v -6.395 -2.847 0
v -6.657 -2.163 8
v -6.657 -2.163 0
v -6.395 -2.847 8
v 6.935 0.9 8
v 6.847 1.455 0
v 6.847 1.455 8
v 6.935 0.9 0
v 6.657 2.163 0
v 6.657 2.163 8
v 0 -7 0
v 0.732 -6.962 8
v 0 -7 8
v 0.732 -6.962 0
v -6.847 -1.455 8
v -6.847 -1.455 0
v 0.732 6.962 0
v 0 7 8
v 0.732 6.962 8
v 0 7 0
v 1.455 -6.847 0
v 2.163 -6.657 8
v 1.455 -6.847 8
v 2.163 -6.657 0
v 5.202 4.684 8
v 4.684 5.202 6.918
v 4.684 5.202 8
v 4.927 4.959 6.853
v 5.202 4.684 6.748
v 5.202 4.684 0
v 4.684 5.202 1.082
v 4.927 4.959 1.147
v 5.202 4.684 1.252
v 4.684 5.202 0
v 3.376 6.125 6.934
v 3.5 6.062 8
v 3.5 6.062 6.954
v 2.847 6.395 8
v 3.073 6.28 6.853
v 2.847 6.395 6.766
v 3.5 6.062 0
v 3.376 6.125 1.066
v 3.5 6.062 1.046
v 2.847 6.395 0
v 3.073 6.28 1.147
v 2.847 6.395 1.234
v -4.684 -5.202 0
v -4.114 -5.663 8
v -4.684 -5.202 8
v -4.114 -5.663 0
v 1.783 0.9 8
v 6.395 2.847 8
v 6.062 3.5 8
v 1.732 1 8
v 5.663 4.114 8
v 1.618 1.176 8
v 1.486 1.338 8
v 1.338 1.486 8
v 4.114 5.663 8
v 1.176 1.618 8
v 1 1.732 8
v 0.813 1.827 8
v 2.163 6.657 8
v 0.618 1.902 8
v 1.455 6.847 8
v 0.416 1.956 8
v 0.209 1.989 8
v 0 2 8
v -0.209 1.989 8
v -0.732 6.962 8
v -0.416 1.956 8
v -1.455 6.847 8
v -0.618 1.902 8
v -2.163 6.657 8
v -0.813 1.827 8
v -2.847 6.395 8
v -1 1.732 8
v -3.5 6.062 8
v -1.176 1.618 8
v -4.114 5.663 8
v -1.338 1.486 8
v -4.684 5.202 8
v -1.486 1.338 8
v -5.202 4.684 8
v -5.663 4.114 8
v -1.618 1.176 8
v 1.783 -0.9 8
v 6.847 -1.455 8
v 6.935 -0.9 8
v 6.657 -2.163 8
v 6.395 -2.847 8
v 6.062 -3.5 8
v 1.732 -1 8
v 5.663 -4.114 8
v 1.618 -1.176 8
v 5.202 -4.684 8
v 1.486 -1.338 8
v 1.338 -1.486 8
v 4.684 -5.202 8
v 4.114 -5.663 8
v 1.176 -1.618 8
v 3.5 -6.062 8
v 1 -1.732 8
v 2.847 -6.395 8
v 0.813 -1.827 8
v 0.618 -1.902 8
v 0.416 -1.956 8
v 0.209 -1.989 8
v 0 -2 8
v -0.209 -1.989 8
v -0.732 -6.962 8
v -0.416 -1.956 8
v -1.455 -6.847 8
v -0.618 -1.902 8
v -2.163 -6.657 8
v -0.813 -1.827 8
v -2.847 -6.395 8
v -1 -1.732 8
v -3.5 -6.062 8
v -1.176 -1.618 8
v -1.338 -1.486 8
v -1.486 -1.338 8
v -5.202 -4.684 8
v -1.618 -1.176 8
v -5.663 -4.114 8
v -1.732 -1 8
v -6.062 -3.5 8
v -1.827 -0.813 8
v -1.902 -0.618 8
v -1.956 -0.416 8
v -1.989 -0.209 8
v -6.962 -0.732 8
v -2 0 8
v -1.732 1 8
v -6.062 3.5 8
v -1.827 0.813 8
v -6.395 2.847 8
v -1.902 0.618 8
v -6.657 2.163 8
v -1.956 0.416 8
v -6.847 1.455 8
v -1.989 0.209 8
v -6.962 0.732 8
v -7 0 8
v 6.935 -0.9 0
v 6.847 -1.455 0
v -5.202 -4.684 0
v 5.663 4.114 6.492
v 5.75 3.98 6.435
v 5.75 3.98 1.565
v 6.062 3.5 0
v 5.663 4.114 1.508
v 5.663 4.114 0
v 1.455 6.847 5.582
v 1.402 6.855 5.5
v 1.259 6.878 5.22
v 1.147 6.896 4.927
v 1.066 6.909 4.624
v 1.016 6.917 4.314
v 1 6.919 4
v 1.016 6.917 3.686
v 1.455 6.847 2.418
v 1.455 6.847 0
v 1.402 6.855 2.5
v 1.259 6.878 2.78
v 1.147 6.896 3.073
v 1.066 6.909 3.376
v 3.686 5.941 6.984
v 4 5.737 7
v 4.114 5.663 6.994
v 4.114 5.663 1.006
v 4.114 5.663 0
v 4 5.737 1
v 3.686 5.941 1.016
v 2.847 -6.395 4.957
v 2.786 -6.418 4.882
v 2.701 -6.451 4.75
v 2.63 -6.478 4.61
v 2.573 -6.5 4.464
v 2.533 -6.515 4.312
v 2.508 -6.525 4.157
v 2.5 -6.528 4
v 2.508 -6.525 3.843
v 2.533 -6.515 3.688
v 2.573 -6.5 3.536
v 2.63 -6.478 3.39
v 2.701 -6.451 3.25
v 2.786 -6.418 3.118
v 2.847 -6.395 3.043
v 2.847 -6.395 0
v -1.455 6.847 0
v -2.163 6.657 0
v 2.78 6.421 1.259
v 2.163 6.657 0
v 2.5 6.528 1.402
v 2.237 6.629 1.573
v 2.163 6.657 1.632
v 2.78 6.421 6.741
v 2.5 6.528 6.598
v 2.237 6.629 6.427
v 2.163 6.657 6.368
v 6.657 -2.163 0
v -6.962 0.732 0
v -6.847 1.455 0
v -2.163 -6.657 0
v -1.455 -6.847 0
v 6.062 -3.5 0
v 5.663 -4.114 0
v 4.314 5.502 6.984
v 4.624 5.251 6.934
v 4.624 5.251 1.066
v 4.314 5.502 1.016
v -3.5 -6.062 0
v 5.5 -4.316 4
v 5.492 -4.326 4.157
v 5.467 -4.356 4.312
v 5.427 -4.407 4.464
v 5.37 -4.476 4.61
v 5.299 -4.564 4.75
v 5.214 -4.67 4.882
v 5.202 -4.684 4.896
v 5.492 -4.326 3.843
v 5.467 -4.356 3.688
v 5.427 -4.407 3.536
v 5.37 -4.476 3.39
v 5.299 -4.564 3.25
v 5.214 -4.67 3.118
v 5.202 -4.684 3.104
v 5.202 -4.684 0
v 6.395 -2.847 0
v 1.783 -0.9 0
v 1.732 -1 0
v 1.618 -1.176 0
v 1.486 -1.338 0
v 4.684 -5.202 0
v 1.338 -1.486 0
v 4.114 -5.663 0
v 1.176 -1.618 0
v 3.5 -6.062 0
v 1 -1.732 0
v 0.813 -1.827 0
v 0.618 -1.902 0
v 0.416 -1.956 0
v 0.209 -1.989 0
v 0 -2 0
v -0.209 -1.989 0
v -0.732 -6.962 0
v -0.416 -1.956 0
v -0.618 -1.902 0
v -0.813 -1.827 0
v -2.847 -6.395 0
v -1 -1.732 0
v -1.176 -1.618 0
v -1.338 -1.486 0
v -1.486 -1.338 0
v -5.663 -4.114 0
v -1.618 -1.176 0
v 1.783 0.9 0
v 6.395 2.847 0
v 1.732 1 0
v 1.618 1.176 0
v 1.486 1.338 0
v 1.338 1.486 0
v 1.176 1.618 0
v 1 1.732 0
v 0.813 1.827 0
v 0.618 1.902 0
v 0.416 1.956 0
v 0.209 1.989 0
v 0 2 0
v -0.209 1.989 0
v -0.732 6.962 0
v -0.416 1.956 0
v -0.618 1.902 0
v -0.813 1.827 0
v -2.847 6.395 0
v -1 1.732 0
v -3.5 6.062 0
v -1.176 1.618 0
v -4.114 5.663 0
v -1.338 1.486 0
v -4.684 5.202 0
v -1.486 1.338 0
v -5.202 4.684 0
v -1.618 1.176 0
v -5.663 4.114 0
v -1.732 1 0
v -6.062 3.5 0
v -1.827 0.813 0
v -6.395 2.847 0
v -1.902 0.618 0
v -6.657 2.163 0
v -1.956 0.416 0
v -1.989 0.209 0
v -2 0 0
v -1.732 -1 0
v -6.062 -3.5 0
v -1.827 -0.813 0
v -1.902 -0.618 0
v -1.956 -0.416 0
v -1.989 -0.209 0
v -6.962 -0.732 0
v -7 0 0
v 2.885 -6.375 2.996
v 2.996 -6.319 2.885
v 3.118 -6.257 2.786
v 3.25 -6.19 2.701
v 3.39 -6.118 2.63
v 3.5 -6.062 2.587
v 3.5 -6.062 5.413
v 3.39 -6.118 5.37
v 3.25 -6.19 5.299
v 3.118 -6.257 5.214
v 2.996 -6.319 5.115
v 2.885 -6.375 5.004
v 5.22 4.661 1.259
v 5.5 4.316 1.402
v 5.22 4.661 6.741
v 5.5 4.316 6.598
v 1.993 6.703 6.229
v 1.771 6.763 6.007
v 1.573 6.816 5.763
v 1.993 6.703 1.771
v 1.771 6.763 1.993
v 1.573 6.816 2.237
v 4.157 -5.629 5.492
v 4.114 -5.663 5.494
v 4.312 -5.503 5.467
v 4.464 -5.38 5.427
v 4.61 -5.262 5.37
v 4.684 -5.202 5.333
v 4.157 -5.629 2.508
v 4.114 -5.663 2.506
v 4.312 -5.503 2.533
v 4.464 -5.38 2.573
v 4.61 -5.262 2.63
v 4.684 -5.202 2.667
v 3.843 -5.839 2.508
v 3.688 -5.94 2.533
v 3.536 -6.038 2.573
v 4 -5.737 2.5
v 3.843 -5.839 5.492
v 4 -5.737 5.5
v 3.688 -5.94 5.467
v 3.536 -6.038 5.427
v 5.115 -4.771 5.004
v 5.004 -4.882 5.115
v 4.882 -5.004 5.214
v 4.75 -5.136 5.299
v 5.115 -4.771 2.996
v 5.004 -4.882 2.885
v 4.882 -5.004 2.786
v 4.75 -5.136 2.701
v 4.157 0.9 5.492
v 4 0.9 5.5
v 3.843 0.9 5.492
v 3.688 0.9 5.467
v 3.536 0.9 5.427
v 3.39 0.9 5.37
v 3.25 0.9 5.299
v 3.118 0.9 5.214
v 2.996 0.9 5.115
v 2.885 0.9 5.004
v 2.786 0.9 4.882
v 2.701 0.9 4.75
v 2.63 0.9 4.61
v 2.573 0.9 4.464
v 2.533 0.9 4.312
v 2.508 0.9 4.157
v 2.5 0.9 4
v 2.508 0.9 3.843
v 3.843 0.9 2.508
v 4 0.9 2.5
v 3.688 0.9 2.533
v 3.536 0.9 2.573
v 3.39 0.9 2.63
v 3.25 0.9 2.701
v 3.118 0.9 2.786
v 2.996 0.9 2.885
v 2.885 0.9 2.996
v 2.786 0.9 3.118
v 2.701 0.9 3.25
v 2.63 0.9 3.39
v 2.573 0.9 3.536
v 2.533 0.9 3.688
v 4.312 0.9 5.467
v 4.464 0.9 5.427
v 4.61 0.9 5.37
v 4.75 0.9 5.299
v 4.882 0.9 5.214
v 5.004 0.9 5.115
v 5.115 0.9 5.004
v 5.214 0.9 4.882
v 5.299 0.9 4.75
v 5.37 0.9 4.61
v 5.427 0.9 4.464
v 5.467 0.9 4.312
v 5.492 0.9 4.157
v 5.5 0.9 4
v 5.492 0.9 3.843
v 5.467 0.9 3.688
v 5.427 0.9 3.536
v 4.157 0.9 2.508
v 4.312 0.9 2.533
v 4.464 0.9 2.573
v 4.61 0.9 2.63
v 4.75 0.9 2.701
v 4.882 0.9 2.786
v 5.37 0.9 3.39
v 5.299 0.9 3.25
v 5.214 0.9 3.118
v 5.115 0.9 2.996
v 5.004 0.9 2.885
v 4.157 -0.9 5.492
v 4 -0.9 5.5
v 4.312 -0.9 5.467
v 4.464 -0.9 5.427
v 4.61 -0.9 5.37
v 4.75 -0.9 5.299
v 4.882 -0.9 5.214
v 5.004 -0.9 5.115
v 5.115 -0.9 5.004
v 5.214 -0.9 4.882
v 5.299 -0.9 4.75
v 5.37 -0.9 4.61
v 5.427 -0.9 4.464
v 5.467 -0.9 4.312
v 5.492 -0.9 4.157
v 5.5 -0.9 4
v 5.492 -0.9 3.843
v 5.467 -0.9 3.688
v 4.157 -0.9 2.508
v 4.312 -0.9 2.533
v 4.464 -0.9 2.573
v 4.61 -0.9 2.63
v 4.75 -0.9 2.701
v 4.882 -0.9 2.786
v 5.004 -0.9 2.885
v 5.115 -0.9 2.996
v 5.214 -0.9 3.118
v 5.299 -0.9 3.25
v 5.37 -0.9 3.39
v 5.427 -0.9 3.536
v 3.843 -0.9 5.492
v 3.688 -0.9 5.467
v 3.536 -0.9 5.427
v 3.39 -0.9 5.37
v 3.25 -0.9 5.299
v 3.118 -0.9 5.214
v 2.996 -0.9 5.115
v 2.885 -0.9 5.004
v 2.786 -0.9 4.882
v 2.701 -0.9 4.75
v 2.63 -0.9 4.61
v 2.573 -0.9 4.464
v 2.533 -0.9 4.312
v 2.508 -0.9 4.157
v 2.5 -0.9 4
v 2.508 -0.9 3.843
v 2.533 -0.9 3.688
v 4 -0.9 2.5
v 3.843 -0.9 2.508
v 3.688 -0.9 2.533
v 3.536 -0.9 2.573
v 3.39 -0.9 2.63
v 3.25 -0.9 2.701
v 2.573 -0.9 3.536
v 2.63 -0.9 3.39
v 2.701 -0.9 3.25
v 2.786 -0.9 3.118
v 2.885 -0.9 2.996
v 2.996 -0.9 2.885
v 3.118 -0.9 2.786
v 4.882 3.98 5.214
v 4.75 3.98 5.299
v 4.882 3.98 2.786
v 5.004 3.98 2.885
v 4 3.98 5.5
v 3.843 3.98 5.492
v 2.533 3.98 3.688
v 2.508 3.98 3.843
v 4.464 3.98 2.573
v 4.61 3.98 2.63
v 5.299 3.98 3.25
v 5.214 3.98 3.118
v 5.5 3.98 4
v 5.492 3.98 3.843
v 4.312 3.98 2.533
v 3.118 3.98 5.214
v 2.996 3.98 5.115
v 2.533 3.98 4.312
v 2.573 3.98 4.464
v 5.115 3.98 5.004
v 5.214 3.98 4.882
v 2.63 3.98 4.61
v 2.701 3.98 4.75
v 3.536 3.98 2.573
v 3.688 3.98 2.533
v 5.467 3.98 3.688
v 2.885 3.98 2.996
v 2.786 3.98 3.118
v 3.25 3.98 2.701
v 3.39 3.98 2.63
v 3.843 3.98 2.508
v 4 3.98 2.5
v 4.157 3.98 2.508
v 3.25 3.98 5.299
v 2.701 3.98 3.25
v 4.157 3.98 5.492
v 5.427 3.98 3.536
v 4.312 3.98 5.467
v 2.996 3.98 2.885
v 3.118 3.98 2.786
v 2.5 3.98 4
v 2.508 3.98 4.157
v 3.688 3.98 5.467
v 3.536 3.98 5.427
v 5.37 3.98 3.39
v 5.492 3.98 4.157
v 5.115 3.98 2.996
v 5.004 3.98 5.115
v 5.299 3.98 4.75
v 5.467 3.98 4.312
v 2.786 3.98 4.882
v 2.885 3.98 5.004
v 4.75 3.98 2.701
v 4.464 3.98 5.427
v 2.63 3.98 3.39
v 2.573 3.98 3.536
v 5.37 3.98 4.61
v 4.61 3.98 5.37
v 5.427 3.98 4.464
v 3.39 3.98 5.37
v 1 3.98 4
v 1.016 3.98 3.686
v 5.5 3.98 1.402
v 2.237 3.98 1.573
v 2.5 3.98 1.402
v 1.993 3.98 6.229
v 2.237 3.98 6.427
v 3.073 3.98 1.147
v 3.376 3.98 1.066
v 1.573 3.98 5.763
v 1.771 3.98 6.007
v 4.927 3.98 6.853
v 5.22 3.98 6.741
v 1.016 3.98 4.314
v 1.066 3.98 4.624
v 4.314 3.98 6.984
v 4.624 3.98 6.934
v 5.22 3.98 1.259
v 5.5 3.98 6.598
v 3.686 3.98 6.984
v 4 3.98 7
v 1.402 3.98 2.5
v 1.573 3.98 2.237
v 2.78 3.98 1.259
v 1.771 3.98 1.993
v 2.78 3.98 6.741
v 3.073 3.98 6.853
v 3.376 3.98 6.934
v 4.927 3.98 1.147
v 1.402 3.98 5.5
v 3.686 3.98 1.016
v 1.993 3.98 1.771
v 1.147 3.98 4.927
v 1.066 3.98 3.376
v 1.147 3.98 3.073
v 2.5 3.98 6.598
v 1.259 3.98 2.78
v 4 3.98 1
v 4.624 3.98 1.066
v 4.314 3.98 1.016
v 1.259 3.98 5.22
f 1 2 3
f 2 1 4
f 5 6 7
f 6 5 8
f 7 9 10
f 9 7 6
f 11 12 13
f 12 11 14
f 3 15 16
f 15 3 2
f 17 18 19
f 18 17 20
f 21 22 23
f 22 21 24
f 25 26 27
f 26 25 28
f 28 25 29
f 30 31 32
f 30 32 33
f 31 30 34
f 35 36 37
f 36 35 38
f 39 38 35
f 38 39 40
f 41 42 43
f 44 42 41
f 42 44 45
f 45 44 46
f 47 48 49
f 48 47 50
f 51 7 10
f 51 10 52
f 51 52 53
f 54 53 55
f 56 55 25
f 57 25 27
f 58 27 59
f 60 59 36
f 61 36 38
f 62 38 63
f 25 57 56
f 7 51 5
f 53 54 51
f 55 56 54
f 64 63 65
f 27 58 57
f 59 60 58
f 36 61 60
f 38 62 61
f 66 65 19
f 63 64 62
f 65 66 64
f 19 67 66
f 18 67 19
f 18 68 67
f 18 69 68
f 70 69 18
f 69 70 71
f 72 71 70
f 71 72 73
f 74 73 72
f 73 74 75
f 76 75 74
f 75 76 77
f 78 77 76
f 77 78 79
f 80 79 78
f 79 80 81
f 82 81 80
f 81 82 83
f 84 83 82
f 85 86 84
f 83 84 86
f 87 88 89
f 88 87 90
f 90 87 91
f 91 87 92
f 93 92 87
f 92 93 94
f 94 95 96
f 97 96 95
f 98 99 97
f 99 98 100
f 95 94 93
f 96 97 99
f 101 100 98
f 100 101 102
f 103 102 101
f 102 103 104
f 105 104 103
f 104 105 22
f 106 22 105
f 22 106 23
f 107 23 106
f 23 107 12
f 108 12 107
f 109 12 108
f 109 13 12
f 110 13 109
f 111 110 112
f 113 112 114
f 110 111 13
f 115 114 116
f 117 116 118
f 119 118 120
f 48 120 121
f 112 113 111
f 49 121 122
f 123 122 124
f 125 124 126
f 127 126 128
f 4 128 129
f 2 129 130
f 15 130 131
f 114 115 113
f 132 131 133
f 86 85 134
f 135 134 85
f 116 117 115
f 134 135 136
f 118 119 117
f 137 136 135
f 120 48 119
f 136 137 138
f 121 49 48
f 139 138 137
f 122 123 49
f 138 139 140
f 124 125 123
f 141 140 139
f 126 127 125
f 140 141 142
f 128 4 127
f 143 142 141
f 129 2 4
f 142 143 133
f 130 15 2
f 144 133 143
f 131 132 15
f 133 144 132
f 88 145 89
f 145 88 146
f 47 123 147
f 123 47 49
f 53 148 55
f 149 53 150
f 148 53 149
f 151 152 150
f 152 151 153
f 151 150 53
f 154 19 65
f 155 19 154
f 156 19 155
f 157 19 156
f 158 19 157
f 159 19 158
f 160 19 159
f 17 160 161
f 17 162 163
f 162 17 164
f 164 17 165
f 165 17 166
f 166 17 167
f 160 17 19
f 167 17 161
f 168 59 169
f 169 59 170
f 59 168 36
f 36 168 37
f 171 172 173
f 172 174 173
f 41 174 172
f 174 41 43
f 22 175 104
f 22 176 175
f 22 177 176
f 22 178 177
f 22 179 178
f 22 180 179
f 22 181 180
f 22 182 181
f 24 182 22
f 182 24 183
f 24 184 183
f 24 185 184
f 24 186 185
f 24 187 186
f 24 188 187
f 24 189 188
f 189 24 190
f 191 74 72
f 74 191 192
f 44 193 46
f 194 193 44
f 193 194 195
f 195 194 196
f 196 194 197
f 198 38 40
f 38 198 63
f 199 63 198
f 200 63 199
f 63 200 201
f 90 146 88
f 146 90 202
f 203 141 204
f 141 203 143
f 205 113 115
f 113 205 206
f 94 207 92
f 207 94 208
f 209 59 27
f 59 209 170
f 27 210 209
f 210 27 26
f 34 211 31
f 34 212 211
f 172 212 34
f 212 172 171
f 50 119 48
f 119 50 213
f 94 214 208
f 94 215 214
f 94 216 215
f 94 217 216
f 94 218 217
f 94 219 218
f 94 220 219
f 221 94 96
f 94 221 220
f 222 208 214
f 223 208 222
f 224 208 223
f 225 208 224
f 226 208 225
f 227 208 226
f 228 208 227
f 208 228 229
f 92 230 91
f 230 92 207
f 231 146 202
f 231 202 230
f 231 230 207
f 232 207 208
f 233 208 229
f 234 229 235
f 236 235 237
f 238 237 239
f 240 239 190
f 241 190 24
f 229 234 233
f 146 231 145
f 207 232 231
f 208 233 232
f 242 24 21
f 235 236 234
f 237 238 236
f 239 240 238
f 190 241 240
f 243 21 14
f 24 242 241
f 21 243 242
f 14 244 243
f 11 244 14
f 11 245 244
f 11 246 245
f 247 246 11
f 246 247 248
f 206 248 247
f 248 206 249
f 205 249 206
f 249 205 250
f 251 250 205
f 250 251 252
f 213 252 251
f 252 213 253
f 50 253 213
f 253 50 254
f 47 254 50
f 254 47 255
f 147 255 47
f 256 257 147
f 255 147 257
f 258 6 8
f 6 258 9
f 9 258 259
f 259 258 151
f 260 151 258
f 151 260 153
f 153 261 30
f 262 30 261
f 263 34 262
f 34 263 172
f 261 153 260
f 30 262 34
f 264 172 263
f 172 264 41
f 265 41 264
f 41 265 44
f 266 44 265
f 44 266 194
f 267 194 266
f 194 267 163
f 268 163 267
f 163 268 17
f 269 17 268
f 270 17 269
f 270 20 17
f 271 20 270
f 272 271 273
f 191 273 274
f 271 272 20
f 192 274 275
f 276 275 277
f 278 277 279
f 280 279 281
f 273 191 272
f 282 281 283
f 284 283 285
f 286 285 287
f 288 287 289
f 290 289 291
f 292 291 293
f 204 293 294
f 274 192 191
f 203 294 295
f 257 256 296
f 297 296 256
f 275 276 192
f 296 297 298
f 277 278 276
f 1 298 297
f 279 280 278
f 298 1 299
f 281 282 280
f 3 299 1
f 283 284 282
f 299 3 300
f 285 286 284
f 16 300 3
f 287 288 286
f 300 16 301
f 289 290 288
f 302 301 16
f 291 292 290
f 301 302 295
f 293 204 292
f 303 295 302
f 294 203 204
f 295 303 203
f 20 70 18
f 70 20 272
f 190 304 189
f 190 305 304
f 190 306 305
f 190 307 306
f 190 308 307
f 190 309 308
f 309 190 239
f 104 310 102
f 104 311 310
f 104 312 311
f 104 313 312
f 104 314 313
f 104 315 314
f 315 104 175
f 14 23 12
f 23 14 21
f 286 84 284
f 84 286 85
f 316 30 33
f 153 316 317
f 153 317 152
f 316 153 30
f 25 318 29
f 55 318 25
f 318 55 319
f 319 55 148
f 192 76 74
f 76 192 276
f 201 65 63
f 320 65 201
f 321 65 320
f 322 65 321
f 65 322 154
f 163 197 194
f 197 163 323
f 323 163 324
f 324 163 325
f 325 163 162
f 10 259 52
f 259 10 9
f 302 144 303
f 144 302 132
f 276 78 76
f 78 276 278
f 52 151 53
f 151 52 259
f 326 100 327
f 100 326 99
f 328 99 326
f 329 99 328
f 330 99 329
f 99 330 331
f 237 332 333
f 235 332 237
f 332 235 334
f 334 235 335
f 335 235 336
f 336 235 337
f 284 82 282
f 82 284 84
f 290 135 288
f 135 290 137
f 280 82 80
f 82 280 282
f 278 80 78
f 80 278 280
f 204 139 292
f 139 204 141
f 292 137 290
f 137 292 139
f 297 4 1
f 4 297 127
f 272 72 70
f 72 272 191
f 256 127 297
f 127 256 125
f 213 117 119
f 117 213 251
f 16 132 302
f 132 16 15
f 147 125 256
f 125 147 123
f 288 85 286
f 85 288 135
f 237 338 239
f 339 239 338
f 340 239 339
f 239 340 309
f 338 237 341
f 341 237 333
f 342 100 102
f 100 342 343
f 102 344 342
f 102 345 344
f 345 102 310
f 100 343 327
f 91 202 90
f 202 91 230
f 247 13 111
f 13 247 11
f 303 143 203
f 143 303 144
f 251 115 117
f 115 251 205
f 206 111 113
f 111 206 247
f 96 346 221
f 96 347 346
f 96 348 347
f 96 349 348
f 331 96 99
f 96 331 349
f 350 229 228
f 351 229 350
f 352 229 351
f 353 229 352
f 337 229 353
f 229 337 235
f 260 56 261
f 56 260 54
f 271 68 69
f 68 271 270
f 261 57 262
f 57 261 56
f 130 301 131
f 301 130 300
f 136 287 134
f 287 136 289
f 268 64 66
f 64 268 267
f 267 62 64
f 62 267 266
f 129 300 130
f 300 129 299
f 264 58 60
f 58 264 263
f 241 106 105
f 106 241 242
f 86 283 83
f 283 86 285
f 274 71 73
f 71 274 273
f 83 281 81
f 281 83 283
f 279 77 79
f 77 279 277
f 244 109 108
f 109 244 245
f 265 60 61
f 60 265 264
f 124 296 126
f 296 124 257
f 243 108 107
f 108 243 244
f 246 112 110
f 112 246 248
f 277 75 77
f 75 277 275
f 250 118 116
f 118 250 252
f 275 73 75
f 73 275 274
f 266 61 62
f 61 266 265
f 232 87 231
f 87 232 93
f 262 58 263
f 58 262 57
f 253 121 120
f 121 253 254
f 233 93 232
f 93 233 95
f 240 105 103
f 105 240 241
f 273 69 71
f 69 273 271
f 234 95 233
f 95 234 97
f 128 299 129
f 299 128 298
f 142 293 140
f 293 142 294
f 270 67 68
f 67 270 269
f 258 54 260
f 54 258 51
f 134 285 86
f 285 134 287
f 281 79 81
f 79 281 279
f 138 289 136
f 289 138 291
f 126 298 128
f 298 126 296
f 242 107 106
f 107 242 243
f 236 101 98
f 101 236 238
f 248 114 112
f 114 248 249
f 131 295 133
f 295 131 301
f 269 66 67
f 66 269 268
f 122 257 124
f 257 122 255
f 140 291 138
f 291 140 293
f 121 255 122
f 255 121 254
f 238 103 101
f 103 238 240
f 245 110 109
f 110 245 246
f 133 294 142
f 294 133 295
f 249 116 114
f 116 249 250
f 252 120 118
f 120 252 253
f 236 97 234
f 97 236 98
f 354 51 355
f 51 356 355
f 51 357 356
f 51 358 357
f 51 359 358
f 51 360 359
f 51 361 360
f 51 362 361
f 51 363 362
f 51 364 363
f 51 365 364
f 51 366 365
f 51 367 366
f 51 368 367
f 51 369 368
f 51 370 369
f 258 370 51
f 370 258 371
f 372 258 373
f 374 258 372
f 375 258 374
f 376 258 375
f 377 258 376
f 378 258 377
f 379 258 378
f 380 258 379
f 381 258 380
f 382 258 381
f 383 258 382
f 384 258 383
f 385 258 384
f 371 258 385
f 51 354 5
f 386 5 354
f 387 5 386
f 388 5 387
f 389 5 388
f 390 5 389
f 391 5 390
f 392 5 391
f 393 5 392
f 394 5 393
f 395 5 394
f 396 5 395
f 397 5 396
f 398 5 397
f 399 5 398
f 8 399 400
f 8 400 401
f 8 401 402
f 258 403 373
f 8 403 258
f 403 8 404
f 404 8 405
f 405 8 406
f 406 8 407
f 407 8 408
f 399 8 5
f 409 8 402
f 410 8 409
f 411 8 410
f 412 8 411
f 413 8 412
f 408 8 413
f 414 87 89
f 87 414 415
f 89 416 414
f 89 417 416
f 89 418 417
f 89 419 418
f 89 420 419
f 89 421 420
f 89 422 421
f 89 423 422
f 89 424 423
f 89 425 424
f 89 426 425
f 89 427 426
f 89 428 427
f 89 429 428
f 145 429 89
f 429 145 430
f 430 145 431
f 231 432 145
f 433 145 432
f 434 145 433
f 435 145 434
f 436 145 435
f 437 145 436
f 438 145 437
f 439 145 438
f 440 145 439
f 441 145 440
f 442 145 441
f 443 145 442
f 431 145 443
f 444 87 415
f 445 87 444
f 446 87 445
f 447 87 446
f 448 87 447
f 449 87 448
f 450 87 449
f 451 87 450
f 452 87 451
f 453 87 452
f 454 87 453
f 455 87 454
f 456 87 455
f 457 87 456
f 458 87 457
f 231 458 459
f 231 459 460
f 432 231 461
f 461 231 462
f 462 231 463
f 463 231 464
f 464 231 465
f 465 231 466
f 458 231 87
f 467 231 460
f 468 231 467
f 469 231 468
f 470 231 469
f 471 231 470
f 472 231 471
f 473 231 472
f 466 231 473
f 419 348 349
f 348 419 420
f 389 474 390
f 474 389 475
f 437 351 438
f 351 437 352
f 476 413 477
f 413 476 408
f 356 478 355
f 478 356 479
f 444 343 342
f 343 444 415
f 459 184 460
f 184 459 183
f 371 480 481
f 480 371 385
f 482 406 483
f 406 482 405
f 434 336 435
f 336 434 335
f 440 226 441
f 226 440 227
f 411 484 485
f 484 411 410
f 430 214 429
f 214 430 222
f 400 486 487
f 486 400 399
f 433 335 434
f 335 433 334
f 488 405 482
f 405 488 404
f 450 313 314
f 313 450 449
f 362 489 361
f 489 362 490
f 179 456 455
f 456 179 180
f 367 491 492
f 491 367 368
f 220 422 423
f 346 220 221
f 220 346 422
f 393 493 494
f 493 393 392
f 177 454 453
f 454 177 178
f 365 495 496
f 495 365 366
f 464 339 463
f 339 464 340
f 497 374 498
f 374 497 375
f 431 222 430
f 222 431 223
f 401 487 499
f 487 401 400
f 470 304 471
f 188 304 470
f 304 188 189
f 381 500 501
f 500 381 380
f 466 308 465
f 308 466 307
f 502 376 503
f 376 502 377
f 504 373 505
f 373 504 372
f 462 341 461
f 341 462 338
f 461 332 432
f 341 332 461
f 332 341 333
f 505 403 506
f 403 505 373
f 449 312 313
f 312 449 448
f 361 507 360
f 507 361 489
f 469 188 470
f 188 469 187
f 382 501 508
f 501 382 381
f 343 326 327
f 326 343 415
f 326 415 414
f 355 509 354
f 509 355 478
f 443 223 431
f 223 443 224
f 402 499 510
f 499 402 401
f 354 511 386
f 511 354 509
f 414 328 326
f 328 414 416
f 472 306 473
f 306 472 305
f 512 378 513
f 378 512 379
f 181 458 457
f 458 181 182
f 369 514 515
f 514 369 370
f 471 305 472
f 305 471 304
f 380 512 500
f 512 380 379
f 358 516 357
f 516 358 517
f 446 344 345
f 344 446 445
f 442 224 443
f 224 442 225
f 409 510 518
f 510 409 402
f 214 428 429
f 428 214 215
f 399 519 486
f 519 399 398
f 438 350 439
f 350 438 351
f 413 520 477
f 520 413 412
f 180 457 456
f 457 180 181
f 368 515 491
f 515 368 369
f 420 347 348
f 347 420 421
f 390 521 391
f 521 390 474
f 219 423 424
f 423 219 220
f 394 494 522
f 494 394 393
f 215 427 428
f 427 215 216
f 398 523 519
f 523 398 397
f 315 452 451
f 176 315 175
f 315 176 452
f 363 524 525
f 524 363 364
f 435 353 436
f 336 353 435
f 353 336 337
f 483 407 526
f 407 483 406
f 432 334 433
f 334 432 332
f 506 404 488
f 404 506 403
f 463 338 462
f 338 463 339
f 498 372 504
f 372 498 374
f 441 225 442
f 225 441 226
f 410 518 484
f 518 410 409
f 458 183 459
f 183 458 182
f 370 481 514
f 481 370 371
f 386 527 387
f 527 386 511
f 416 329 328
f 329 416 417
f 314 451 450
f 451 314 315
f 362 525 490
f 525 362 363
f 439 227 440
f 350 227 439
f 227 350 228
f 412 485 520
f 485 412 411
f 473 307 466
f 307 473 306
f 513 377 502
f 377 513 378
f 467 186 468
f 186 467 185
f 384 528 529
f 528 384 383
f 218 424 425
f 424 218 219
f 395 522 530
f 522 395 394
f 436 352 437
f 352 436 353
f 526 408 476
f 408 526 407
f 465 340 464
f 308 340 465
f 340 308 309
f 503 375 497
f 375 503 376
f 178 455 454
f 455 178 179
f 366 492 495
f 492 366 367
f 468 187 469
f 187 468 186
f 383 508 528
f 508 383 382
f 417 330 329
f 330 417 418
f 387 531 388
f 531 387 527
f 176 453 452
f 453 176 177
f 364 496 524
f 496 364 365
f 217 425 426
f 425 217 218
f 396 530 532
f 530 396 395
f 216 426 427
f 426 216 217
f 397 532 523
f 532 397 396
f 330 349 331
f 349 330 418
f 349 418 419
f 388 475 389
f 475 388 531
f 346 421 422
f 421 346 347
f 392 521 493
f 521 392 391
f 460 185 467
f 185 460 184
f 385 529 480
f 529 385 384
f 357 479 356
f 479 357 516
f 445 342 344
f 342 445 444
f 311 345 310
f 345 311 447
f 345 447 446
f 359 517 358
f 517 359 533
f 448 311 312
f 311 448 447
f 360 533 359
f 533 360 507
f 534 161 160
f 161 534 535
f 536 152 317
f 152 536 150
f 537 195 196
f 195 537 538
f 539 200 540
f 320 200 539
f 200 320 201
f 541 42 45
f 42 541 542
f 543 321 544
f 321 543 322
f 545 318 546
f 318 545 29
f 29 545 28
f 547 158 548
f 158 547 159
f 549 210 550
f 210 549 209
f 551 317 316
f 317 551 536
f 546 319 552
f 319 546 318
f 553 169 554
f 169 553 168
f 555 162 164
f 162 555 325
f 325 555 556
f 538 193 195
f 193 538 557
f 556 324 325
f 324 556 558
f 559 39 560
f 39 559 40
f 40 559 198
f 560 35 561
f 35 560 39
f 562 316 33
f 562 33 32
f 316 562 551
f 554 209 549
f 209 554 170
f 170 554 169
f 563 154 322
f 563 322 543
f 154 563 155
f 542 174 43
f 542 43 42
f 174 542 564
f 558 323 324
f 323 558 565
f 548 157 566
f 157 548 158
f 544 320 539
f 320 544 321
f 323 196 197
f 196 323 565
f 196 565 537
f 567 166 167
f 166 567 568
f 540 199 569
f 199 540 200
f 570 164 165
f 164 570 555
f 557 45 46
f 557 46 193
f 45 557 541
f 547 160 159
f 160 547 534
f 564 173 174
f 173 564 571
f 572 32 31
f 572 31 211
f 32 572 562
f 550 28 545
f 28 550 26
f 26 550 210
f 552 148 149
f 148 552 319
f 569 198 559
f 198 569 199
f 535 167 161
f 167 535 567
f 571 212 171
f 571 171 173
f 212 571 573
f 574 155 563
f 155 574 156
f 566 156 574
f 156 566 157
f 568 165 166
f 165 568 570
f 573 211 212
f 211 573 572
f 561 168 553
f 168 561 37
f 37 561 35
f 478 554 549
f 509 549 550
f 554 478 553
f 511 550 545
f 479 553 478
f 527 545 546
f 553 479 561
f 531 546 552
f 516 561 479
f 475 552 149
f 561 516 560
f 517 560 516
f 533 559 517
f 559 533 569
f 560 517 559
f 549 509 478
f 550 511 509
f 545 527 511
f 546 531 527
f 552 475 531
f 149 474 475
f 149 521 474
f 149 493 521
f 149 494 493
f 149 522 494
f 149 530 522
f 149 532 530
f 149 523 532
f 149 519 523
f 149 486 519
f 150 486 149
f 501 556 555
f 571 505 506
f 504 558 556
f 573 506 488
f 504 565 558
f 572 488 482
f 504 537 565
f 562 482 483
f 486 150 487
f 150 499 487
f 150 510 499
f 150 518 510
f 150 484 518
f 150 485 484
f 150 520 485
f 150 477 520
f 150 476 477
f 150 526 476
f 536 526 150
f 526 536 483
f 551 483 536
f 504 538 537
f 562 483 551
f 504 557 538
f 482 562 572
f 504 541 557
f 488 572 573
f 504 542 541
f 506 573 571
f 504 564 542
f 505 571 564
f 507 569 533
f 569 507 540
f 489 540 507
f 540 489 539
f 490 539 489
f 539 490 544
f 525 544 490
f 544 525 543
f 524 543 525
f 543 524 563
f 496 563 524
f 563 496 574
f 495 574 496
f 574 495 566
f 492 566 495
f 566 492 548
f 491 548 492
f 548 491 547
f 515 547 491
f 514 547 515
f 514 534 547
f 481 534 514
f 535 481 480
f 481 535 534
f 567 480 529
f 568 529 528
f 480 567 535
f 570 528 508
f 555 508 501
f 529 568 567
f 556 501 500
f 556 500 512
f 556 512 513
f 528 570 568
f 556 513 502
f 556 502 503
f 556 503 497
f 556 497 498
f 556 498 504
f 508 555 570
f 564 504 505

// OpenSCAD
// C-style split collar for 4 mm shaft.
$fn = 60;
eps = 0.02;
shaft_d = 4;
outer_d = 14;
width = 8;
slit_w = 1.8;
screw_d = 3.0;
difference() {
    cylinder(d = outer_d, h = width);
    translate([0, 0, -eps]) cylinder(d = shaft_d, h = width + 2 * eps);
    translate([0, -slit_w / 2, -eps]) cube([outer_d / 2 + eps, slit_w, width + 2 * eps]);
    translate([outer_d / 2 - 3, -outer_d / 2 - eps, width / 2]) rotate([-90, 0, 0]) cylinder(d = screw_d, h = outer_d + 2 * eps);
    translate([outer_d / 2 - 3, outer_d / 2 - 3 - eps, width / 2]) rotate([-90, 0, 0]) cylinder(d = screw_d + 3, h = 3 + 2 * eps);
}
